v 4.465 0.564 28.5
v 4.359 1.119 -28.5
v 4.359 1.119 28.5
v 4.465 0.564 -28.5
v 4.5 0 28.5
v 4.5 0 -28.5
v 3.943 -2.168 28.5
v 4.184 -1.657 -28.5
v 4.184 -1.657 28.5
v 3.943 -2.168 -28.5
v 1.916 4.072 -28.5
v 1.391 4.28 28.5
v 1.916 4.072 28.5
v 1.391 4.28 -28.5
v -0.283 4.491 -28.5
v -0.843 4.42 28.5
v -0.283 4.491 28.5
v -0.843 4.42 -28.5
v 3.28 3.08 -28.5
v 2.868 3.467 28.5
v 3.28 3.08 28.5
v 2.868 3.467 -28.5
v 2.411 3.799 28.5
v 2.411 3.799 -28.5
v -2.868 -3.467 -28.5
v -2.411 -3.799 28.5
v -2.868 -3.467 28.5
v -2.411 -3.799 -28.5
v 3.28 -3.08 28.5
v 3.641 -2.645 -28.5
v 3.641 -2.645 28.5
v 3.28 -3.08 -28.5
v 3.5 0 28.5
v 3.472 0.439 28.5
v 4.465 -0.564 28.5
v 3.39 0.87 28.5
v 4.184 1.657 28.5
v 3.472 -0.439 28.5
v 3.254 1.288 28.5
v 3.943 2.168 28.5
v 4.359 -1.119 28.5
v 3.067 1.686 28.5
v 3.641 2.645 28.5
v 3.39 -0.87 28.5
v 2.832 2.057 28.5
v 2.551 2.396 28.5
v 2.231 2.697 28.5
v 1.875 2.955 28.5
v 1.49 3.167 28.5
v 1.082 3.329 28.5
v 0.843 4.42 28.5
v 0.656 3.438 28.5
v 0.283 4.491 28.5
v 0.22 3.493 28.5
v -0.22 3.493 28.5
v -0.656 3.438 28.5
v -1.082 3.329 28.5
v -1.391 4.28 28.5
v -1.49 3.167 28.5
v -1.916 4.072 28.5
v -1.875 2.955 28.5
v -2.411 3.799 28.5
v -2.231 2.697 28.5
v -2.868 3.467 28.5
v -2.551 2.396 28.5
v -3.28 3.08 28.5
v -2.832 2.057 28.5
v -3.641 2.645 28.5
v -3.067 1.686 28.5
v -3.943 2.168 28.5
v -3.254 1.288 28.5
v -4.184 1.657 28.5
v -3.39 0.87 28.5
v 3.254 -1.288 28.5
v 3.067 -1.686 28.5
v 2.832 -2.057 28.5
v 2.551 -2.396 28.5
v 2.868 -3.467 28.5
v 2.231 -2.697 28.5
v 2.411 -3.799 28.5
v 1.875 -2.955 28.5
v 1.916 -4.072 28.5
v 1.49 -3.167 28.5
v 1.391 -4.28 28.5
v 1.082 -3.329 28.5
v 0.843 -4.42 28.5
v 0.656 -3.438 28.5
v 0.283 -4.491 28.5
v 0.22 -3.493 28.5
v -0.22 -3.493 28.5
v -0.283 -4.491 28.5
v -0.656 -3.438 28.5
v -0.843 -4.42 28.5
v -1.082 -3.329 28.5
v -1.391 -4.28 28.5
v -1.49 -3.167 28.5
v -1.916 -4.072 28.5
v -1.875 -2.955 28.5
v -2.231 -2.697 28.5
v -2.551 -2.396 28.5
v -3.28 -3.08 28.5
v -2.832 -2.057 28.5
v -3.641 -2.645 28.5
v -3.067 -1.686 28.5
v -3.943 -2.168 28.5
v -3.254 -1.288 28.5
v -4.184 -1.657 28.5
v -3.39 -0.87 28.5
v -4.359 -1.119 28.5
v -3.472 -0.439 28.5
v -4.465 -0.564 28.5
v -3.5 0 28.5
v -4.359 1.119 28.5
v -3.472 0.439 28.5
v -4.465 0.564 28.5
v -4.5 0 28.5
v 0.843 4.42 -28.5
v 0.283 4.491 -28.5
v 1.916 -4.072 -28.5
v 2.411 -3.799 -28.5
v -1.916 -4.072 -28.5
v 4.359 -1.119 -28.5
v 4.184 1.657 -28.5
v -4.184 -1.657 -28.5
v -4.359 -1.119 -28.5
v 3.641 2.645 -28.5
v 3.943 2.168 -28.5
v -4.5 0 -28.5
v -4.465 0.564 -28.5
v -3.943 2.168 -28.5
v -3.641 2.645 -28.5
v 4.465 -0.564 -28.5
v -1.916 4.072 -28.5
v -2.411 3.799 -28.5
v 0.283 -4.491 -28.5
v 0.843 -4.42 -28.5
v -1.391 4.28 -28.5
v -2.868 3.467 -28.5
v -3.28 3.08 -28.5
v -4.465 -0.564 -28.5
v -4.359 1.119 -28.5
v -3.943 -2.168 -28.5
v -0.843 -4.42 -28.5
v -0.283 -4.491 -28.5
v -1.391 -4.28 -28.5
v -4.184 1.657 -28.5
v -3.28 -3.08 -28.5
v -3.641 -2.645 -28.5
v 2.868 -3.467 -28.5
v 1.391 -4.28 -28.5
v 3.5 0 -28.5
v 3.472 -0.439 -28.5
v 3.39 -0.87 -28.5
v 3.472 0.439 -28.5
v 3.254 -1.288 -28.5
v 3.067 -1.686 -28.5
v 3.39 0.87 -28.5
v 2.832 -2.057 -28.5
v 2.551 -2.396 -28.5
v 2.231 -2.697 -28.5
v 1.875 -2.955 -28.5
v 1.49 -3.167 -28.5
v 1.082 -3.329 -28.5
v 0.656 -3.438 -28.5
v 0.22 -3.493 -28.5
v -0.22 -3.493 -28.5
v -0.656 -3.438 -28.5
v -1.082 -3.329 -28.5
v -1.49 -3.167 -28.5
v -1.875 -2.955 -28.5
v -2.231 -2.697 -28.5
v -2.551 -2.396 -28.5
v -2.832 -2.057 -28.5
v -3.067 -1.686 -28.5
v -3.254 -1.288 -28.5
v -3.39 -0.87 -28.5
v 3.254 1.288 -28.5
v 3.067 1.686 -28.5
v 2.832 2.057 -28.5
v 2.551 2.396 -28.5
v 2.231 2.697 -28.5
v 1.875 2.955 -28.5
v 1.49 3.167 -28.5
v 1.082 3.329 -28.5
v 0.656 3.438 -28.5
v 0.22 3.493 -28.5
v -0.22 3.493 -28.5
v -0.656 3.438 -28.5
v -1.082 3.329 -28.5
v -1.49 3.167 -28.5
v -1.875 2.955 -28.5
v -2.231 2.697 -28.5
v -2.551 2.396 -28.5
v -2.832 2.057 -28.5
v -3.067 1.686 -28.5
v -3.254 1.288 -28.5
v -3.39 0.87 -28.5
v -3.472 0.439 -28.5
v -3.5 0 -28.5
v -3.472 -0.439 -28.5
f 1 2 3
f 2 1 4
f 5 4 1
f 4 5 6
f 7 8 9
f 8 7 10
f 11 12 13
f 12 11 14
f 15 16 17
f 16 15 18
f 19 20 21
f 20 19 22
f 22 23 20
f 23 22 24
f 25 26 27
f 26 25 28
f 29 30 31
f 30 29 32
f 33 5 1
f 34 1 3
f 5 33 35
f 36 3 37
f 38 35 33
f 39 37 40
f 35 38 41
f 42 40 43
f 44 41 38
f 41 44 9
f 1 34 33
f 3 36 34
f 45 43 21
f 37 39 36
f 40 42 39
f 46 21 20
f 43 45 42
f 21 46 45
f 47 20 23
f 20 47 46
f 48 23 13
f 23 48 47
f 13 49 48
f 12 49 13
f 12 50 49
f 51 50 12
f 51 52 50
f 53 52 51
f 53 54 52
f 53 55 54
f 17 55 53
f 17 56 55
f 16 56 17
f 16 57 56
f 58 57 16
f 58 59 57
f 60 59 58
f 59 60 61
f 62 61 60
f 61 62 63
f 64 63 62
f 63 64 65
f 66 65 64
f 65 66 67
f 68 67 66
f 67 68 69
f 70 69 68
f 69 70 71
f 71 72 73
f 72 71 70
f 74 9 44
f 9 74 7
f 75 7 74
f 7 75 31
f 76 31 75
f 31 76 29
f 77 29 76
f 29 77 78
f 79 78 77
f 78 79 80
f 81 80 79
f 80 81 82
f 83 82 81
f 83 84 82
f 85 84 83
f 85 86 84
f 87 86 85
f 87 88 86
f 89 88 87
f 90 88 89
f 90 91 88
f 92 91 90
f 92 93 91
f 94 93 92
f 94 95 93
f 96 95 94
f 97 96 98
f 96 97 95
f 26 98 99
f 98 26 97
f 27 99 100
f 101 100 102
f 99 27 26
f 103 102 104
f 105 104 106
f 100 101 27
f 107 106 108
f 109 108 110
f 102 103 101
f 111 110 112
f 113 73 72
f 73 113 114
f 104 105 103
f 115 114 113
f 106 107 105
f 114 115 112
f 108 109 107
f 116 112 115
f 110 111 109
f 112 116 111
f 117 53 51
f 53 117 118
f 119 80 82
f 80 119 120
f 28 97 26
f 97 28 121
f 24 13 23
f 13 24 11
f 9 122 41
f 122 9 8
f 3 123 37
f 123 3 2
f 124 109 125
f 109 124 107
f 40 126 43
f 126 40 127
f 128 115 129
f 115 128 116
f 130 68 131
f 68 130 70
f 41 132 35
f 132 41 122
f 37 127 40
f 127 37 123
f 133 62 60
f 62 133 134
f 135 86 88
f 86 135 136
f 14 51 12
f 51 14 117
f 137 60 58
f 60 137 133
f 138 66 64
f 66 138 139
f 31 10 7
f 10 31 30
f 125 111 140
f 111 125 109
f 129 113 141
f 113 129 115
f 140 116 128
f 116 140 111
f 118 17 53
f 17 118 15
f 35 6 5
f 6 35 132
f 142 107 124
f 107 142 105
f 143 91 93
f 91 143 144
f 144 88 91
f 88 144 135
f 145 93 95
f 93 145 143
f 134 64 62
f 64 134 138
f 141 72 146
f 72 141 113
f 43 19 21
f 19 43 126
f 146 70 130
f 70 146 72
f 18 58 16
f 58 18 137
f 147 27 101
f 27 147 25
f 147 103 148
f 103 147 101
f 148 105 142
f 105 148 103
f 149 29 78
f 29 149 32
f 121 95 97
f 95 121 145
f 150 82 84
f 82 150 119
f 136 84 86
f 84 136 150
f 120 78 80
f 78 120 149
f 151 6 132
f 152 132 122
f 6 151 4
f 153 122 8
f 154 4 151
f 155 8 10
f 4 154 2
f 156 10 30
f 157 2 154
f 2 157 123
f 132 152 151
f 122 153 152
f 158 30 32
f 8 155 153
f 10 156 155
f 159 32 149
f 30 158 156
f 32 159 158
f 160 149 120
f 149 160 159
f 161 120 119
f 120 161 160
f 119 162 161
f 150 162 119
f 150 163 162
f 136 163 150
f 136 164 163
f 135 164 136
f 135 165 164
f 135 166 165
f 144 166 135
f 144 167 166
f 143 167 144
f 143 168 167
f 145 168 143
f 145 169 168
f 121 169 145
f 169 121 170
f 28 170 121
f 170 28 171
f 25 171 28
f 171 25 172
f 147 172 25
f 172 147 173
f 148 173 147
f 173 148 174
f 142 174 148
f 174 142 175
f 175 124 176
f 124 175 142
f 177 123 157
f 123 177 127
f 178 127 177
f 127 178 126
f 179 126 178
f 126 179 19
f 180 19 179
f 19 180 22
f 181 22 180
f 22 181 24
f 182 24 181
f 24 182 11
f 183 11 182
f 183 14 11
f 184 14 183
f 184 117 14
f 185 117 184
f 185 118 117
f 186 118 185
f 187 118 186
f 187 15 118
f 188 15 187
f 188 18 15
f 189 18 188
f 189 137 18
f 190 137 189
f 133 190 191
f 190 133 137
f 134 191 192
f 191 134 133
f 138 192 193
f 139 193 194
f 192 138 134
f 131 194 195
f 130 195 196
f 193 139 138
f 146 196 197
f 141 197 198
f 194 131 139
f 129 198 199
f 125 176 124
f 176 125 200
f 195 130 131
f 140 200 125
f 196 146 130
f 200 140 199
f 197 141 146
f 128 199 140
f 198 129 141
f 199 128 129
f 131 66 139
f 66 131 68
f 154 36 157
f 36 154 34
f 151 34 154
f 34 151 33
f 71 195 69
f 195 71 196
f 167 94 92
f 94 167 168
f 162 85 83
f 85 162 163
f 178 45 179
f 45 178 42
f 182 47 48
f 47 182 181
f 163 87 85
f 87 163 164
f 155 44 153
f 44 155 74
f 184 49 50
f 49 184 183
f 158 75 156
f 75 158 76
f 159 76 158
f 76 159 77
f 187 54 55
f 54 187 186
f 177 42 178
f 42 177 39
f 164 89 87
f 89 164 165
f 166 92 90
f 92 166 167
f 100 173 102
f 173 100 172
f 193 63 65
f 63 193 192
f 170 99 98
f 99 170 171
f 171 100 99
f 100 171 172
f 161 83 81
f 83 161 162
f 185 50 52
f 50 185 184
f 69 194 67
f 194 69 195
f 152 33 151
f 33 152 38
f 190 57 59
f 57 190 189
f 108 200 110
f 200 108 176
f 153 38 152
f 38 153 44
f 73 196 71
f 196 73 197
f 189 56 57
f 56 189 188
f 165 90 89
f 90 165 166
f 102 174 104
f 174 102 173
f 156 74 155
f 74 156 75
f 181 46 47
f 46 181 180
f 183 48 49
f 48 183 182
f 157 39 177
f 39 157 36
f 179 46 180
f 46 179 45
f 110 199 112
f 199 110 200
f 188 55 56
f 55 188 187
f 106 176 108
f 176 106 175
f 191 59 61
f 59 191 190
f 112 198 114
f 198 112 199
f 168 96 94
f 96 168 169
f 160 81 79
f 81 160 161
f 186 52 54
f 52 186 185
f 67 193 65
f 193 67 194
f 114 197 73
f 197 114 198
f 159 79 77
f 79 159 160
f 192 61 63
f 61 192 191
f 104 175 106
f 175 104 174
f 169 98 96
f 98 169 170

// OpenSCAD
$fn = 50;


difference() {
	union() {
		translate(v = [0, 0, -28.5000000000]) {
			cylinder(h = 57, r = 4.5000000000);
		}
	}
	union() {
		translate(v = [0, 0, -100.0000000000]) {
			cylinder(h = 200, r = 3.5000000000);
		}
	}
}
